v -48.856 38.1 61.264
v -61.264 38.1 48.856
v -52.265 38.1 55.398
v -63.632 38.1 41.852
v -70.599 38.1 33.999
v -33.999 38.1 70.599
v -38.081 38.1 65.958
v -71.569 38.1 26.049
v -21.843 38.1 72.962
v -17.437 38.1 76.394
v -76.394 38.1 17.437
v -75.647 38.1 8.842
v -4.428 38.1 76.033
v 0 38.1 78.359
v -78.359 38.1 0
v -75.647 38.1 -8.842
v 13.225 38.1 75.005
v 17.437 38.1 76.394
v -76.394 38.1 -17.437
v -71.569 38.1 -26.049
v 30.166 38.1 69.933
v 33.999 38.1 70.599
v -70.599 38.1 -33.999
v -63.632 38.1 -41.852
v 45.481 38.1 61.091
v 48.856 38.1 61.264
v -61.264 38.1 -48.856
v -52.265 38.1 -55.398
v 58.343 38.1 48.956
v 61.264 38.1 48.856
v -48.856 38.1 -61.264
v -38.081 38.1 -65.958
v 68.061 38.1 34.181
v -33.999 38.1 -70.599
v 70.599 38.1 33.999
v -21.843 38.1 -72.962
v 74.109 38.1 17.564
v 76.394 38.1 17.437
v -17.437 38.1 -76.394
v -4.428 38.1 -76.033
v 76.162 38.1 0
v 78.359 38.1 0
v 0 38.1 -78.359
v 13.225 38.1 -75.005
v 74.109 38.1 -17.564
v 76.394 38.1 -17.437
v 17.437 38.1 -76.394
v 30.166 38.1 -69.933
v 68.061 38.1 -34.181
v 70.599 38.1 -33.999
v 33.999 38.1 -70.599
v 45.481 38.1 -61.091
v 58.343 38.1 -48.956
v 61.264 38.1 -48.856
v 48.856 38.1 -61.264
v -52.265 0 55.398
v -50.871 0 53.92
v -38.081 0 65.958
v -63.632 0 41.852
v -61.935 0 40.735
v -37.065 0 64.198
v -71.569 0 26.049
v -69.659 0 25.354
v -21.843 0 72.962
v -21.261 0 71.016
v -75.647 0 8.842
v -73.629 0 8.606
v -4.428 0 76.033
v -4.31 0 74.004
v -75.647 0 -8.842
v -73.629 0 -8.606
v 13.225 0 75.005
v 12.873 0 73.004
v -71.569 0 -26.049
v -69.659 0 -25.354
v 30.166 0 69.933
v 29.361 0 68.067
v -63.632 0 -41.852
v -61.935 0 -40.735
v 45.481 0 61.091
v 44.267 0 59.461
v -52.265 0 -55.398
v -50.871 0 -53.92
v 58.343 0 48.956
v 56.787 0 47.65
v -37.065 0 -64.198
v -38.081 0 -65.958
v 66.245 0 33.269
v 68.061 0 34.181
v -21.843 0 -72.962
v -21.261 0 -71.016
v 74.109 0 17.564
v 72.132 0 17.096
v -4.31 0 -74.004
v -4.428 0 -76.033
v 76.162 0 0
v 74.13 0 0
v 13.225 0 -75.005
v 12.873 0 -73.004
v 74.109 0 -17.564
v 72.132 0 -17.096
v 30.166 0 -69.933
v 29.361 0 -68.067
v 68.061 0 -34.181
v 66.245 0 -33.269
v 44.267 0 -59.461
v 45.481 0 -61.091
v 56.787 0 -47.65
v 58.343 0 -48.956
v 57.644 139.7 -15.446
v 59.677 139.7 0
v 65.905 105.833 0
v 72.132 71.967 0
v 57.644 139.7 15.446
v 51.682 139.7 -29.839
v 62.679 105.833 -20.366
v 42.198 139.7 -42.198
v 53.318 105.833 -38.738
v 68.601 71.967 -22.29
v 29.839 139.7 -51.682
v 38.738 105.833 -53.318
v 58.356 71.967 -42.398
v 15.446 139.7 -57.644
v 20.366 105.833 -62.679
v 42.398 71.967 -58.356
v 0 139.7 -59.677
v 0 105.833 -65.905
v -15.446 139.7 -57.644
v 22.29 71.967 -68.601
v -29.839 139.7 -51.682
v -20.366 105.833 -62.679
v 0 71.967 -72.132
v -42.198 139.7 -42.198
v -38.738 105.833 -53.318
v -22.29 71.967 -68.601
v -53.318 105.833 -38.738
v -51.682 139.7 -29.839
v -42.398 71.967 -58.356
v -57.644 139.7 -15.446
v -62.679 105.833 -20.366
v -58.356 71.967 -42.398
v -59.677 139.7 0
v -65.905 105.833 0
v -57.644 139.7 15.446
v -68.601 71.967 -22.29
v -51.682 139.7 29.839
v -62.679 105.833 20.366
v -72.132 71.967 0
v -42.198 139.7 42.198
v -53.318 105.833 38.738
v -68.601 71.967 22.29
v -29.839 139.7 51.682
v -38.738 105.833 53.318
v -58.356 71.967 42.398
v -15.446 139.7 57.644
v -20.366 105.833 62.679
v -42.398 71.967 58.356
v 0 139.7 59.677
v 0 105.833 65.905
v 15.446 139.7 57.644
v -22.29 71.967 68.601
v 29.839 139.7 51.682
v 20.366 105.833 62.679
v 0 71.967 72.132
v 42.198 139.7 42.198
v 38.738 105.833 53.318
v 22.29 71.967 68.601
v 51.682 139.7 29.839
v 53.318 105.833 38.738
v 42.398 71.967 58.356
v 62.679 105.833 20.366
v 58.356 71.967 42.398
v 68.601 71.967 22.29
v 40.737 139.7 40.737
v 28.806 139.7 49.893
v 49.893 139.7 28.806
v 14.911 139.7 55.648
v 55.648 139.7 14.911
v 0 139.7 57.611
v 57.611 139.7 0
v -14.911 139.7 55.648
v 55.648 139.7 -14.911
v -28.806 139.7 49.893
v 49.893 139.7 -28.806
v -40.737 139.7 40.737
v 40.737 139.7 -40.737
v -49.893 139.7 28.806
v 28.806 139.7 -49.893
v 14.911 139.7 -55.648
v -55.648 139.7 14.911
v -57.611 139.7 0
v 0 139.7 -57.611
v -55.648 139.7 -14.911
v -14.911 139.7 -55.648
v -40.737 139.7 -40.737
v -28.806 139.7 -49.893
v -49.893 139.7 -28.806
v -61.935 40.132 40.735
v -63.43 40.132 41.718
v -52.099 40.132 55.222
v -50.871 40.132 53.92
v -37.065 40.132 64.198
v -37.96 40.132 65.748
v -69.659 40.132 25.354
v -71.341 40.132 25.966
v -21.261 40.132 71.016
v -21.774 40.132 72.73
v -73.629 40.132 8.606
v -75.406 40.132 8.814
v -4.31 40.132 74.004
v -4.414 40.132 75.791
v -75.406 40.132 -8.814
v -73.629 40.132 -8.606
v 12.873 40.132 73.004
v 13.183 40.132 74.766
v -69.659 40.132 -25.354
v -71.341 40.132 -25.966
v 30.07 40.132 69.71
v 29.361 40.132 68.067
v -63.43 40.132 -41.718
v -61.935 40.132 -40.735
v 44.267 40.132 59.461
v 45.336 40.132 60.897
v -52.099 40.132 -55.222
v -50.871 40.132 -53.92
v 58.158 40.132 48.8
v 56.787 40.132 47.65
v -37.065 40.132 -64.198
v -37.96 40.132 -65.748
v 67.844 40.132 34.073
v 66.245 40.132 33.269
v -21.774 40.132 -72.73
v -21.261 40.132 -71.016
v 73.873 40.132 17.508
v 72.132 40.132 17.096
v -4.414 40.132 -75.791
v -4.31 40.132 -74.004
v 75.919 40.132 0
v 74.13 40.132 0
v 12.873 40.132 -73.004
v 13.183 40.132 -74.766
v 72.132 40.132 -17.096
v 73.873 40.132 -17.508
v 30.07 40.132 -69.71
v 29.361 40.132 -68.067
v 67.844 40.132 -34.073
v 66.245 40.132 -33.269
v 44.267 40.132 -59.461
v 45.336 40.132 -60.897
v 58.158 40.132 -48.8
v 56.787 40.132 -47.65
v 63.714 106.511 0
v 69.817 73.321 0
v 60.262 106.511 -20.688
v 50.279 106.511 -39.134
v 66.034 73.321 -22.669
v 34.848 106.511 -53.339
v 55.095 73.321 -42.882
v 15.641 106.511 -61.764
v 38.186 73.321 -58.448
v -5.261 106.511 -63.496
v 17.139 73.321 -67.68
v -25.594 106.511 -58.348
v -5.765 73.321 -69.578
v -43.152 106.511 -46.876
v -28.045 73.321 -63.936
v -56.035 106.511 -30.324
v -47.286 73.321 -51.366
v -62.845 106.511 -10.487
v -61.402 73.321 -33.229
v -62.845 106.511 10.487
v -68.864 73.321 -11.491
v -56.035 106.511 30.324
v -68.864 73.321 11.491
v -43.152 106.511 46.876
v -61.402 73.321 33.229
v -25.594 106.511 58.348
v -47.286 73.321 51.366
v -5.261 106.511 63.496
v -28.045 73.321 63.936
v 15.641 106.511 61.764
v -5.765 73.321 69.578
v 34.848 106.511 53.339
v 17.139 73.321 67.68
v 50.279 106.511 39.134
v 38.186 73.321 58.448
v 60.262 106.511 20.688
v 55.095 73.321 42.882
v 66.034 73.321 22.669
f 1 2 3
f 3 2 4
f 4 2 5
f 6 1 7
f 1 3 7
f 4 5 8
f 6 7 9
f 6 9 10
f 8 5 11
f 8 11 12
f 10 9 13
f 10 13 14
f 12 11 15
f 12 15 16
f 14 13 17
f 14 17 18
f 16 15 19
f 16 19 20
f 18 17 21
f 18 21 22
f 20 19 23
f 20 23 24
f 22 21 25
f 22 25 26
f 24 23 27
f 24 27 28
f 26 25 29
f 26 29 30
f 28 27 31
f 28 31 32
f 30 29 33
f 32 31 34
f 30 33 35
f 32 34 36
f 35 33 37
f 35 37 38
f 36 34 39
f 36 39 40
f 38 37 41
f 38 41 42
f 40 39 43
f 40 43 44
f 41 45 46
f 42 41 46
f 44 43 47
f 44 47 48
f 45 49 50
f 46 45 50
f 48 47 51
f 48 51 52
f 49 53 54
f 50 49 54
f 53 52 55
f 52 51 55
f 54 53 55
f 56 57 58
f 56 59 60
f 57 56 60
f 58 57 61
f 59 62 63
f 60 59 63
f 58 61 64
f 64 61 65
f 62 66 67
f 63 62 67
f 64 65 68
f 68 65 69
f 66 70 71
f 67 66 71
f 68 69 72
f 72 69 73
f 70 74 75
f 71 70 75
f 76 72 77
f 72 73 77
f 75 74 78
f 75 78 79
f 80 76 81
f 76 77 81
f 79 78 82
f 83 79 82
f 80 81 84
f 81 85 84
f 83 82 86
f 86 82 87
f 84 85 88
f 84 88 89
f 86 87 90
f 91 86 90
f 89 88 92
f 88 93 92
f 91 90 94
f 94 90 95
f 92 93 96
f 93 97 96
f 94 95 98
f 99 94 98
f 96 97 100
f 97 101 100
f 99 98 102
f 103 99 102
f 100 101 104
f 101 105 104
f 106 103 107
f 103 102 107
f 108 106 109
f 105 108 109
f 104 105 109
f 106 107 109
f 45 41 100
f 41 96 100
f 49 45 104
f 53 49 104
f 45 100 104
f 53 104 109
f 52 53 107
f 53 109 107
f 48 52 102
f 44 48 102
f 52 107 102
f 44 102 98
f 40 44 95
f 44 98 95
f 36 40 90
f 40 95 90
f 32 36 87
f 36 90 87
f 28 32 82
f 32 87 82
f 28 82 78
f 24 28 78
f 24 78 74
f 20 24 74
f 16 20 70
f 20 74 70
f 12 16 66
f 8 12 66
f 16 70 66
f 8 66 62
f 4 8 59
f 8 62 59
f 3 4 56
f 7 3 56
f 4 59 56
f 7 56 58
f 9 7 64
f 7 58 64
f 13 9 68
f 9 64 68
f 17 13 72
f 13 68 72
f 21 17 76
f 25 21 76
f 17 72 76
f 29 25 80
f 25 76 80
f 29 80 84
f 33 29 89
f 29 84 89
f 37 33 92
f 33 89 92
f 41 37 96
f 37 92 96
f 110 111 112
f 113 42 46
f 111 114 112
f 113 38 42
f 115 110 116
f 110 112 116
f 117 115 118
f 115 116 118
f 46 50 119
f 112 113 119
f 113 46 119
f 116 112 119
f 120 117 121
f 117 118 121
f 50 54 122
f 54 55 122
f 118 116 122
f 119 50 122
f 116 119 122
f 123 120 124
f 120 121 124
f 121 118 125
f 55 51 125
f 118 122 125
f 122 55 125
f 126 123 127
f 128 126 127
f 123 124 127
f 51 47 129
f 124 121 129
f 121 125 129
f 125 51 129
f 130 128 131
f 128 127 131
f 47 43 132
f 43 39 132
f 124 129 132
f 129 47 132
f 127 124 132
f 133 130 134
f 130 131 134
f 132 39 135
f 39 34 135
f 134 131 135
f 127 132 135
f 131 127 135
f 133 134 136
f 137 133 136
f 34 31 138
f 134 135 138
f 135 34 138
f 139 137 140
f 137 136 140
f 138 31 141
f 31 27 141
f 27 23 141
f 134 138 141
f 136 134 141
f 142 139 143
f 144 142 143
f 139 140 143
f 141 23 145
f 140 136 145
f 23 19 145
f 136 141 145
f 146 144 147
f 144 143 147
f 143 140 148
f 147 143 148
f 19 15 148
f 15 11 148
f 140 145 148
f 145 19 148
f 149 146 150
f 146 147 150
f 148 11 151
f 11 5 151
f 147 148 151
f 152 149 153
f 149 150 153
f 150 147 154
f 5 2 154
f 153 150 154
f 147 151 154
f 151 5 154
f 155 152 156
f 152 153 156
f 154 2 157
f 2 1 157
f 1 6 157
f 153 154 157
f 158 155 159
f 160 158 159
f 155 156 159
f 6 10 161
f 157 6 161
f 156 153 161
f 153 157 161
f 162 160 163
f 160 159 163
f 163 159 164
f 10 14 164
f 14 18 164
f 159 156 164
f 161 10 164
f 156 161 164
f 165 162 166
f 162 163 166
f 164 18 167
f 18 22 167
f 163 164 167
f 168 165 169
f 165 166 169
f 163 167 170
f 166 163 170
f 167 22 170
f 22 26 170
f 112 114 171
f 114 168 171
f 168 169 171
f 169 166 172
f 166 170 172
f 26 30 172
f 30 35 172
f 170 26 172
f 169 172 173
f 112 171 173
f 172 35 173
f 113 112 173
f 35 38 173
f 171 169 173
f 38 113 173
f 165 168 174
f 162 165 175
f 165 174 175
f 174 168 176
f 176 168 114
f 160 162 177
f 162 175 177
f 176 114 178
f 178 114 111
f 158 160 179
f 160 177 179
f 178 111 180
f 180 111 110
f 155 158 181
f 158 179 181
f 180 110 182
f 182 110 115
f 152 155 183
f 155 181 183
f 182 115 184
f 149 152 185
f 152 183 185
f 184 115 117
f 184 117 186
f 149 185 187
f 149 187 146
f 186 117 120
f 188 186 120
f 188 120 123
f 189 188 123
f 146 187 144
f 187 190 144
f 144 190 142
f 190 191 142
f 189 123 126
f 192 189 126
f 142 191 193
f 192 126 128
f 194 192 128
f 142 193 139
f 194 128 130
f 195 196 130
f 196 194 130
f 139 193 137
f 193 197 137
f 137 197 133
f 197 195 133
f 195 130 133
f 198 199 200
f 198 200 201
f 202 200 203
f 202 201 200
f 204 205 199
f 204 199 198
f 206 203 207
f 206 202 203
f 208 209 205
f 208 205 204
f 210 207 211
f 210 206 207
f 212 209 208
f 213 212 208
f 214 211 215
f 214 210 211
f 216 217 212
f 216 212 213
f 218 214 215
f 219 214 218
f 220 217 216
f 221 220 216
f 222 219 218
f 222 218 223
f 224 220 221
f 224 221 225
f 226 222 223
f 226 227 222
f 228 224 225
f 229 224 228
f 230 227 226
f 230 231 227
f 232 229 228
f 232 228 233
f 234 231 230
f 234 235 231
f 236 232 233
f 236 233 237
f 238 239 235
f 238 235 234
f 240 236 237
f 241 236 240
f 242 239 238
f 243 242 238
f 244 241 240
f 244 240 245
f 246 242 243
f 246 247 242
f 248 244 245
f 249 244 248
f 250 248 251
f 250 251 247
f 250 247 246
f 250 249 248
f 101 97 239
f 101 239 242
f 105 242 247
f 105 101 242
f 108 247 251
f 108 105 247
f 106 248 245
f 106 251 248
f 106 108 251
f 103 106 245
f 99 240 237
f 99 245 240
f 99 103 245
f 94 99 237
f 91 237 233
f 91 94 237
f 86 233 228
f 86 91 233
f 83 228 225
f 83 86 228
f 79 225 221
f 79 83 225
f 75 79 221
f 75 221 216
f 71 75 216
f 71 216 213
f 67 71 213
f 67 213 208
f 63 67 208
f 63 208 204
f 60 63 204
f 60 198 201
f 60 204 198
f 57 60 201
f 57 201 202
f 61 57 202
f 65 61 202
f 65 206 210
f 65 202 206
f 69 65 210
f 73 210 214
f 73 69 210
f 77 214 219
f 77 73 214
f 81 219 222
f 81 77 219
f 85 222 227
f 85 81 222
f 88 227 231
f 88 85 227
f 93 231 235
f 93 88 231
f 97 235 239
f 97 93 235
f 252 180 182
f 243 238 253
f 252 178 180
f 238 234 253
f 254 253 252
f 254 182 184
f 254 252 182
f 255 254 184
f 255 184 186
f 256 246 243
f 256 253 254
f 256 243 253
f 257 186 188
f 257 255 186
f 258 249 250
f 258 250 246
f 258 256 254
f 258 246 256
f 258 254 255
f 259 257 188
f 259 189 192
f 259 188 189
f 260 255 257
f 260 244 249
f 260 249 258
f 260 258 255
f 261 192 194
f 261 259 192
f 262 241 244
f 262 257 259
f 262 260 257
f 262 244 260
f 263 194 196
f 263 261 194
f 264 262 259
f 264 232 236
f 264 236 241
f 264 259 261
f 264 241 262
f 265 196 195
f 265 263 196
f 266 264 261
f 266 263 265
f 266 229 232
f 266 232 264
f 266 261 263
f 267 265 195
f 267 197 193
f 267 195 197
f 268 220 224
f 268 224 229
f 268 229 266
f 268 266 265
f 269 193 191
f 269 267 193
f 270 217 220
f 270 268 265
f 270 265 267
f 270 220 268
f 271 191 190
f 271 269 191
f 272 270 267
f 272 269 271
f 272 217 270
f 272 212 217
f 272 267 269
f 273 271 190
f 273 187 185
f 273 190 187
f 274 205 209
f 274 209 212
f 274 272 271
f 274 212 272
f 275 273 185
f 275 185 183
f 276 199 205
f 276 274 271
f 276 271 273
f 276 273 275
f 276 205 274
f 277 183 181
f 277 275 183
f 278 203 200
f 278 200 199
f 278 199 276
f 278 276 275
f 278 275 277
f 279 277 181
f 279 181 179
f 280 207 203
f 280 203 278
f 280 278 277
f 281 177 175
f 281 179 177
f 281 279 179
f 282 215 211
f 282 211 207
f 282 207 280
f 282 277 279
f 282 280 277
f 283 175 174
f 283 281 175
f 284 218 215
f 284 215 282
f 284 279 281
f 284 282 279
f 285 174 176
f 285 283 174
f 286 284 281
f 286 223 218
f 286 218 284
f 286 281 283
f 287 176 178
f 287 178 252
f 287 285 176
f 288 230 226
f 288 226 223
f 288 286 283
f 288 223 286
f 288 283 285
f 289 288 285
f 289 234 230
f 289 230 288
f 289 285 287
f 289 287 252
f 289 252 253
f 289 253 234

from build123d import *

# Parameters (mm, degrees)
SHELL1_T = -2.032


with BuildPart() as part:
    # Sketch1 → Revolve1 (revolve)
    with BuildSketch(Plane.XY):
        Polygon((0, 139.7), (59.6773, 139.7), (78.359, 38.1), (76.1619, 38.1), (76.1619, 0), (0, 0), align=None)
    revolve(axis=Axis((0, 0, 0), (0, 1, 0)))

    # Shell1
    shell1_openings = [part.faces().sort_by_distance(p)[0] for p in [
        (0, 0, 0),
        (0, 139.7, 0),
    ]]
    offset(amount=SHELL1_T, openings=shell1_openings, kind=Kind.INTERSECTION)


solid = part.part
